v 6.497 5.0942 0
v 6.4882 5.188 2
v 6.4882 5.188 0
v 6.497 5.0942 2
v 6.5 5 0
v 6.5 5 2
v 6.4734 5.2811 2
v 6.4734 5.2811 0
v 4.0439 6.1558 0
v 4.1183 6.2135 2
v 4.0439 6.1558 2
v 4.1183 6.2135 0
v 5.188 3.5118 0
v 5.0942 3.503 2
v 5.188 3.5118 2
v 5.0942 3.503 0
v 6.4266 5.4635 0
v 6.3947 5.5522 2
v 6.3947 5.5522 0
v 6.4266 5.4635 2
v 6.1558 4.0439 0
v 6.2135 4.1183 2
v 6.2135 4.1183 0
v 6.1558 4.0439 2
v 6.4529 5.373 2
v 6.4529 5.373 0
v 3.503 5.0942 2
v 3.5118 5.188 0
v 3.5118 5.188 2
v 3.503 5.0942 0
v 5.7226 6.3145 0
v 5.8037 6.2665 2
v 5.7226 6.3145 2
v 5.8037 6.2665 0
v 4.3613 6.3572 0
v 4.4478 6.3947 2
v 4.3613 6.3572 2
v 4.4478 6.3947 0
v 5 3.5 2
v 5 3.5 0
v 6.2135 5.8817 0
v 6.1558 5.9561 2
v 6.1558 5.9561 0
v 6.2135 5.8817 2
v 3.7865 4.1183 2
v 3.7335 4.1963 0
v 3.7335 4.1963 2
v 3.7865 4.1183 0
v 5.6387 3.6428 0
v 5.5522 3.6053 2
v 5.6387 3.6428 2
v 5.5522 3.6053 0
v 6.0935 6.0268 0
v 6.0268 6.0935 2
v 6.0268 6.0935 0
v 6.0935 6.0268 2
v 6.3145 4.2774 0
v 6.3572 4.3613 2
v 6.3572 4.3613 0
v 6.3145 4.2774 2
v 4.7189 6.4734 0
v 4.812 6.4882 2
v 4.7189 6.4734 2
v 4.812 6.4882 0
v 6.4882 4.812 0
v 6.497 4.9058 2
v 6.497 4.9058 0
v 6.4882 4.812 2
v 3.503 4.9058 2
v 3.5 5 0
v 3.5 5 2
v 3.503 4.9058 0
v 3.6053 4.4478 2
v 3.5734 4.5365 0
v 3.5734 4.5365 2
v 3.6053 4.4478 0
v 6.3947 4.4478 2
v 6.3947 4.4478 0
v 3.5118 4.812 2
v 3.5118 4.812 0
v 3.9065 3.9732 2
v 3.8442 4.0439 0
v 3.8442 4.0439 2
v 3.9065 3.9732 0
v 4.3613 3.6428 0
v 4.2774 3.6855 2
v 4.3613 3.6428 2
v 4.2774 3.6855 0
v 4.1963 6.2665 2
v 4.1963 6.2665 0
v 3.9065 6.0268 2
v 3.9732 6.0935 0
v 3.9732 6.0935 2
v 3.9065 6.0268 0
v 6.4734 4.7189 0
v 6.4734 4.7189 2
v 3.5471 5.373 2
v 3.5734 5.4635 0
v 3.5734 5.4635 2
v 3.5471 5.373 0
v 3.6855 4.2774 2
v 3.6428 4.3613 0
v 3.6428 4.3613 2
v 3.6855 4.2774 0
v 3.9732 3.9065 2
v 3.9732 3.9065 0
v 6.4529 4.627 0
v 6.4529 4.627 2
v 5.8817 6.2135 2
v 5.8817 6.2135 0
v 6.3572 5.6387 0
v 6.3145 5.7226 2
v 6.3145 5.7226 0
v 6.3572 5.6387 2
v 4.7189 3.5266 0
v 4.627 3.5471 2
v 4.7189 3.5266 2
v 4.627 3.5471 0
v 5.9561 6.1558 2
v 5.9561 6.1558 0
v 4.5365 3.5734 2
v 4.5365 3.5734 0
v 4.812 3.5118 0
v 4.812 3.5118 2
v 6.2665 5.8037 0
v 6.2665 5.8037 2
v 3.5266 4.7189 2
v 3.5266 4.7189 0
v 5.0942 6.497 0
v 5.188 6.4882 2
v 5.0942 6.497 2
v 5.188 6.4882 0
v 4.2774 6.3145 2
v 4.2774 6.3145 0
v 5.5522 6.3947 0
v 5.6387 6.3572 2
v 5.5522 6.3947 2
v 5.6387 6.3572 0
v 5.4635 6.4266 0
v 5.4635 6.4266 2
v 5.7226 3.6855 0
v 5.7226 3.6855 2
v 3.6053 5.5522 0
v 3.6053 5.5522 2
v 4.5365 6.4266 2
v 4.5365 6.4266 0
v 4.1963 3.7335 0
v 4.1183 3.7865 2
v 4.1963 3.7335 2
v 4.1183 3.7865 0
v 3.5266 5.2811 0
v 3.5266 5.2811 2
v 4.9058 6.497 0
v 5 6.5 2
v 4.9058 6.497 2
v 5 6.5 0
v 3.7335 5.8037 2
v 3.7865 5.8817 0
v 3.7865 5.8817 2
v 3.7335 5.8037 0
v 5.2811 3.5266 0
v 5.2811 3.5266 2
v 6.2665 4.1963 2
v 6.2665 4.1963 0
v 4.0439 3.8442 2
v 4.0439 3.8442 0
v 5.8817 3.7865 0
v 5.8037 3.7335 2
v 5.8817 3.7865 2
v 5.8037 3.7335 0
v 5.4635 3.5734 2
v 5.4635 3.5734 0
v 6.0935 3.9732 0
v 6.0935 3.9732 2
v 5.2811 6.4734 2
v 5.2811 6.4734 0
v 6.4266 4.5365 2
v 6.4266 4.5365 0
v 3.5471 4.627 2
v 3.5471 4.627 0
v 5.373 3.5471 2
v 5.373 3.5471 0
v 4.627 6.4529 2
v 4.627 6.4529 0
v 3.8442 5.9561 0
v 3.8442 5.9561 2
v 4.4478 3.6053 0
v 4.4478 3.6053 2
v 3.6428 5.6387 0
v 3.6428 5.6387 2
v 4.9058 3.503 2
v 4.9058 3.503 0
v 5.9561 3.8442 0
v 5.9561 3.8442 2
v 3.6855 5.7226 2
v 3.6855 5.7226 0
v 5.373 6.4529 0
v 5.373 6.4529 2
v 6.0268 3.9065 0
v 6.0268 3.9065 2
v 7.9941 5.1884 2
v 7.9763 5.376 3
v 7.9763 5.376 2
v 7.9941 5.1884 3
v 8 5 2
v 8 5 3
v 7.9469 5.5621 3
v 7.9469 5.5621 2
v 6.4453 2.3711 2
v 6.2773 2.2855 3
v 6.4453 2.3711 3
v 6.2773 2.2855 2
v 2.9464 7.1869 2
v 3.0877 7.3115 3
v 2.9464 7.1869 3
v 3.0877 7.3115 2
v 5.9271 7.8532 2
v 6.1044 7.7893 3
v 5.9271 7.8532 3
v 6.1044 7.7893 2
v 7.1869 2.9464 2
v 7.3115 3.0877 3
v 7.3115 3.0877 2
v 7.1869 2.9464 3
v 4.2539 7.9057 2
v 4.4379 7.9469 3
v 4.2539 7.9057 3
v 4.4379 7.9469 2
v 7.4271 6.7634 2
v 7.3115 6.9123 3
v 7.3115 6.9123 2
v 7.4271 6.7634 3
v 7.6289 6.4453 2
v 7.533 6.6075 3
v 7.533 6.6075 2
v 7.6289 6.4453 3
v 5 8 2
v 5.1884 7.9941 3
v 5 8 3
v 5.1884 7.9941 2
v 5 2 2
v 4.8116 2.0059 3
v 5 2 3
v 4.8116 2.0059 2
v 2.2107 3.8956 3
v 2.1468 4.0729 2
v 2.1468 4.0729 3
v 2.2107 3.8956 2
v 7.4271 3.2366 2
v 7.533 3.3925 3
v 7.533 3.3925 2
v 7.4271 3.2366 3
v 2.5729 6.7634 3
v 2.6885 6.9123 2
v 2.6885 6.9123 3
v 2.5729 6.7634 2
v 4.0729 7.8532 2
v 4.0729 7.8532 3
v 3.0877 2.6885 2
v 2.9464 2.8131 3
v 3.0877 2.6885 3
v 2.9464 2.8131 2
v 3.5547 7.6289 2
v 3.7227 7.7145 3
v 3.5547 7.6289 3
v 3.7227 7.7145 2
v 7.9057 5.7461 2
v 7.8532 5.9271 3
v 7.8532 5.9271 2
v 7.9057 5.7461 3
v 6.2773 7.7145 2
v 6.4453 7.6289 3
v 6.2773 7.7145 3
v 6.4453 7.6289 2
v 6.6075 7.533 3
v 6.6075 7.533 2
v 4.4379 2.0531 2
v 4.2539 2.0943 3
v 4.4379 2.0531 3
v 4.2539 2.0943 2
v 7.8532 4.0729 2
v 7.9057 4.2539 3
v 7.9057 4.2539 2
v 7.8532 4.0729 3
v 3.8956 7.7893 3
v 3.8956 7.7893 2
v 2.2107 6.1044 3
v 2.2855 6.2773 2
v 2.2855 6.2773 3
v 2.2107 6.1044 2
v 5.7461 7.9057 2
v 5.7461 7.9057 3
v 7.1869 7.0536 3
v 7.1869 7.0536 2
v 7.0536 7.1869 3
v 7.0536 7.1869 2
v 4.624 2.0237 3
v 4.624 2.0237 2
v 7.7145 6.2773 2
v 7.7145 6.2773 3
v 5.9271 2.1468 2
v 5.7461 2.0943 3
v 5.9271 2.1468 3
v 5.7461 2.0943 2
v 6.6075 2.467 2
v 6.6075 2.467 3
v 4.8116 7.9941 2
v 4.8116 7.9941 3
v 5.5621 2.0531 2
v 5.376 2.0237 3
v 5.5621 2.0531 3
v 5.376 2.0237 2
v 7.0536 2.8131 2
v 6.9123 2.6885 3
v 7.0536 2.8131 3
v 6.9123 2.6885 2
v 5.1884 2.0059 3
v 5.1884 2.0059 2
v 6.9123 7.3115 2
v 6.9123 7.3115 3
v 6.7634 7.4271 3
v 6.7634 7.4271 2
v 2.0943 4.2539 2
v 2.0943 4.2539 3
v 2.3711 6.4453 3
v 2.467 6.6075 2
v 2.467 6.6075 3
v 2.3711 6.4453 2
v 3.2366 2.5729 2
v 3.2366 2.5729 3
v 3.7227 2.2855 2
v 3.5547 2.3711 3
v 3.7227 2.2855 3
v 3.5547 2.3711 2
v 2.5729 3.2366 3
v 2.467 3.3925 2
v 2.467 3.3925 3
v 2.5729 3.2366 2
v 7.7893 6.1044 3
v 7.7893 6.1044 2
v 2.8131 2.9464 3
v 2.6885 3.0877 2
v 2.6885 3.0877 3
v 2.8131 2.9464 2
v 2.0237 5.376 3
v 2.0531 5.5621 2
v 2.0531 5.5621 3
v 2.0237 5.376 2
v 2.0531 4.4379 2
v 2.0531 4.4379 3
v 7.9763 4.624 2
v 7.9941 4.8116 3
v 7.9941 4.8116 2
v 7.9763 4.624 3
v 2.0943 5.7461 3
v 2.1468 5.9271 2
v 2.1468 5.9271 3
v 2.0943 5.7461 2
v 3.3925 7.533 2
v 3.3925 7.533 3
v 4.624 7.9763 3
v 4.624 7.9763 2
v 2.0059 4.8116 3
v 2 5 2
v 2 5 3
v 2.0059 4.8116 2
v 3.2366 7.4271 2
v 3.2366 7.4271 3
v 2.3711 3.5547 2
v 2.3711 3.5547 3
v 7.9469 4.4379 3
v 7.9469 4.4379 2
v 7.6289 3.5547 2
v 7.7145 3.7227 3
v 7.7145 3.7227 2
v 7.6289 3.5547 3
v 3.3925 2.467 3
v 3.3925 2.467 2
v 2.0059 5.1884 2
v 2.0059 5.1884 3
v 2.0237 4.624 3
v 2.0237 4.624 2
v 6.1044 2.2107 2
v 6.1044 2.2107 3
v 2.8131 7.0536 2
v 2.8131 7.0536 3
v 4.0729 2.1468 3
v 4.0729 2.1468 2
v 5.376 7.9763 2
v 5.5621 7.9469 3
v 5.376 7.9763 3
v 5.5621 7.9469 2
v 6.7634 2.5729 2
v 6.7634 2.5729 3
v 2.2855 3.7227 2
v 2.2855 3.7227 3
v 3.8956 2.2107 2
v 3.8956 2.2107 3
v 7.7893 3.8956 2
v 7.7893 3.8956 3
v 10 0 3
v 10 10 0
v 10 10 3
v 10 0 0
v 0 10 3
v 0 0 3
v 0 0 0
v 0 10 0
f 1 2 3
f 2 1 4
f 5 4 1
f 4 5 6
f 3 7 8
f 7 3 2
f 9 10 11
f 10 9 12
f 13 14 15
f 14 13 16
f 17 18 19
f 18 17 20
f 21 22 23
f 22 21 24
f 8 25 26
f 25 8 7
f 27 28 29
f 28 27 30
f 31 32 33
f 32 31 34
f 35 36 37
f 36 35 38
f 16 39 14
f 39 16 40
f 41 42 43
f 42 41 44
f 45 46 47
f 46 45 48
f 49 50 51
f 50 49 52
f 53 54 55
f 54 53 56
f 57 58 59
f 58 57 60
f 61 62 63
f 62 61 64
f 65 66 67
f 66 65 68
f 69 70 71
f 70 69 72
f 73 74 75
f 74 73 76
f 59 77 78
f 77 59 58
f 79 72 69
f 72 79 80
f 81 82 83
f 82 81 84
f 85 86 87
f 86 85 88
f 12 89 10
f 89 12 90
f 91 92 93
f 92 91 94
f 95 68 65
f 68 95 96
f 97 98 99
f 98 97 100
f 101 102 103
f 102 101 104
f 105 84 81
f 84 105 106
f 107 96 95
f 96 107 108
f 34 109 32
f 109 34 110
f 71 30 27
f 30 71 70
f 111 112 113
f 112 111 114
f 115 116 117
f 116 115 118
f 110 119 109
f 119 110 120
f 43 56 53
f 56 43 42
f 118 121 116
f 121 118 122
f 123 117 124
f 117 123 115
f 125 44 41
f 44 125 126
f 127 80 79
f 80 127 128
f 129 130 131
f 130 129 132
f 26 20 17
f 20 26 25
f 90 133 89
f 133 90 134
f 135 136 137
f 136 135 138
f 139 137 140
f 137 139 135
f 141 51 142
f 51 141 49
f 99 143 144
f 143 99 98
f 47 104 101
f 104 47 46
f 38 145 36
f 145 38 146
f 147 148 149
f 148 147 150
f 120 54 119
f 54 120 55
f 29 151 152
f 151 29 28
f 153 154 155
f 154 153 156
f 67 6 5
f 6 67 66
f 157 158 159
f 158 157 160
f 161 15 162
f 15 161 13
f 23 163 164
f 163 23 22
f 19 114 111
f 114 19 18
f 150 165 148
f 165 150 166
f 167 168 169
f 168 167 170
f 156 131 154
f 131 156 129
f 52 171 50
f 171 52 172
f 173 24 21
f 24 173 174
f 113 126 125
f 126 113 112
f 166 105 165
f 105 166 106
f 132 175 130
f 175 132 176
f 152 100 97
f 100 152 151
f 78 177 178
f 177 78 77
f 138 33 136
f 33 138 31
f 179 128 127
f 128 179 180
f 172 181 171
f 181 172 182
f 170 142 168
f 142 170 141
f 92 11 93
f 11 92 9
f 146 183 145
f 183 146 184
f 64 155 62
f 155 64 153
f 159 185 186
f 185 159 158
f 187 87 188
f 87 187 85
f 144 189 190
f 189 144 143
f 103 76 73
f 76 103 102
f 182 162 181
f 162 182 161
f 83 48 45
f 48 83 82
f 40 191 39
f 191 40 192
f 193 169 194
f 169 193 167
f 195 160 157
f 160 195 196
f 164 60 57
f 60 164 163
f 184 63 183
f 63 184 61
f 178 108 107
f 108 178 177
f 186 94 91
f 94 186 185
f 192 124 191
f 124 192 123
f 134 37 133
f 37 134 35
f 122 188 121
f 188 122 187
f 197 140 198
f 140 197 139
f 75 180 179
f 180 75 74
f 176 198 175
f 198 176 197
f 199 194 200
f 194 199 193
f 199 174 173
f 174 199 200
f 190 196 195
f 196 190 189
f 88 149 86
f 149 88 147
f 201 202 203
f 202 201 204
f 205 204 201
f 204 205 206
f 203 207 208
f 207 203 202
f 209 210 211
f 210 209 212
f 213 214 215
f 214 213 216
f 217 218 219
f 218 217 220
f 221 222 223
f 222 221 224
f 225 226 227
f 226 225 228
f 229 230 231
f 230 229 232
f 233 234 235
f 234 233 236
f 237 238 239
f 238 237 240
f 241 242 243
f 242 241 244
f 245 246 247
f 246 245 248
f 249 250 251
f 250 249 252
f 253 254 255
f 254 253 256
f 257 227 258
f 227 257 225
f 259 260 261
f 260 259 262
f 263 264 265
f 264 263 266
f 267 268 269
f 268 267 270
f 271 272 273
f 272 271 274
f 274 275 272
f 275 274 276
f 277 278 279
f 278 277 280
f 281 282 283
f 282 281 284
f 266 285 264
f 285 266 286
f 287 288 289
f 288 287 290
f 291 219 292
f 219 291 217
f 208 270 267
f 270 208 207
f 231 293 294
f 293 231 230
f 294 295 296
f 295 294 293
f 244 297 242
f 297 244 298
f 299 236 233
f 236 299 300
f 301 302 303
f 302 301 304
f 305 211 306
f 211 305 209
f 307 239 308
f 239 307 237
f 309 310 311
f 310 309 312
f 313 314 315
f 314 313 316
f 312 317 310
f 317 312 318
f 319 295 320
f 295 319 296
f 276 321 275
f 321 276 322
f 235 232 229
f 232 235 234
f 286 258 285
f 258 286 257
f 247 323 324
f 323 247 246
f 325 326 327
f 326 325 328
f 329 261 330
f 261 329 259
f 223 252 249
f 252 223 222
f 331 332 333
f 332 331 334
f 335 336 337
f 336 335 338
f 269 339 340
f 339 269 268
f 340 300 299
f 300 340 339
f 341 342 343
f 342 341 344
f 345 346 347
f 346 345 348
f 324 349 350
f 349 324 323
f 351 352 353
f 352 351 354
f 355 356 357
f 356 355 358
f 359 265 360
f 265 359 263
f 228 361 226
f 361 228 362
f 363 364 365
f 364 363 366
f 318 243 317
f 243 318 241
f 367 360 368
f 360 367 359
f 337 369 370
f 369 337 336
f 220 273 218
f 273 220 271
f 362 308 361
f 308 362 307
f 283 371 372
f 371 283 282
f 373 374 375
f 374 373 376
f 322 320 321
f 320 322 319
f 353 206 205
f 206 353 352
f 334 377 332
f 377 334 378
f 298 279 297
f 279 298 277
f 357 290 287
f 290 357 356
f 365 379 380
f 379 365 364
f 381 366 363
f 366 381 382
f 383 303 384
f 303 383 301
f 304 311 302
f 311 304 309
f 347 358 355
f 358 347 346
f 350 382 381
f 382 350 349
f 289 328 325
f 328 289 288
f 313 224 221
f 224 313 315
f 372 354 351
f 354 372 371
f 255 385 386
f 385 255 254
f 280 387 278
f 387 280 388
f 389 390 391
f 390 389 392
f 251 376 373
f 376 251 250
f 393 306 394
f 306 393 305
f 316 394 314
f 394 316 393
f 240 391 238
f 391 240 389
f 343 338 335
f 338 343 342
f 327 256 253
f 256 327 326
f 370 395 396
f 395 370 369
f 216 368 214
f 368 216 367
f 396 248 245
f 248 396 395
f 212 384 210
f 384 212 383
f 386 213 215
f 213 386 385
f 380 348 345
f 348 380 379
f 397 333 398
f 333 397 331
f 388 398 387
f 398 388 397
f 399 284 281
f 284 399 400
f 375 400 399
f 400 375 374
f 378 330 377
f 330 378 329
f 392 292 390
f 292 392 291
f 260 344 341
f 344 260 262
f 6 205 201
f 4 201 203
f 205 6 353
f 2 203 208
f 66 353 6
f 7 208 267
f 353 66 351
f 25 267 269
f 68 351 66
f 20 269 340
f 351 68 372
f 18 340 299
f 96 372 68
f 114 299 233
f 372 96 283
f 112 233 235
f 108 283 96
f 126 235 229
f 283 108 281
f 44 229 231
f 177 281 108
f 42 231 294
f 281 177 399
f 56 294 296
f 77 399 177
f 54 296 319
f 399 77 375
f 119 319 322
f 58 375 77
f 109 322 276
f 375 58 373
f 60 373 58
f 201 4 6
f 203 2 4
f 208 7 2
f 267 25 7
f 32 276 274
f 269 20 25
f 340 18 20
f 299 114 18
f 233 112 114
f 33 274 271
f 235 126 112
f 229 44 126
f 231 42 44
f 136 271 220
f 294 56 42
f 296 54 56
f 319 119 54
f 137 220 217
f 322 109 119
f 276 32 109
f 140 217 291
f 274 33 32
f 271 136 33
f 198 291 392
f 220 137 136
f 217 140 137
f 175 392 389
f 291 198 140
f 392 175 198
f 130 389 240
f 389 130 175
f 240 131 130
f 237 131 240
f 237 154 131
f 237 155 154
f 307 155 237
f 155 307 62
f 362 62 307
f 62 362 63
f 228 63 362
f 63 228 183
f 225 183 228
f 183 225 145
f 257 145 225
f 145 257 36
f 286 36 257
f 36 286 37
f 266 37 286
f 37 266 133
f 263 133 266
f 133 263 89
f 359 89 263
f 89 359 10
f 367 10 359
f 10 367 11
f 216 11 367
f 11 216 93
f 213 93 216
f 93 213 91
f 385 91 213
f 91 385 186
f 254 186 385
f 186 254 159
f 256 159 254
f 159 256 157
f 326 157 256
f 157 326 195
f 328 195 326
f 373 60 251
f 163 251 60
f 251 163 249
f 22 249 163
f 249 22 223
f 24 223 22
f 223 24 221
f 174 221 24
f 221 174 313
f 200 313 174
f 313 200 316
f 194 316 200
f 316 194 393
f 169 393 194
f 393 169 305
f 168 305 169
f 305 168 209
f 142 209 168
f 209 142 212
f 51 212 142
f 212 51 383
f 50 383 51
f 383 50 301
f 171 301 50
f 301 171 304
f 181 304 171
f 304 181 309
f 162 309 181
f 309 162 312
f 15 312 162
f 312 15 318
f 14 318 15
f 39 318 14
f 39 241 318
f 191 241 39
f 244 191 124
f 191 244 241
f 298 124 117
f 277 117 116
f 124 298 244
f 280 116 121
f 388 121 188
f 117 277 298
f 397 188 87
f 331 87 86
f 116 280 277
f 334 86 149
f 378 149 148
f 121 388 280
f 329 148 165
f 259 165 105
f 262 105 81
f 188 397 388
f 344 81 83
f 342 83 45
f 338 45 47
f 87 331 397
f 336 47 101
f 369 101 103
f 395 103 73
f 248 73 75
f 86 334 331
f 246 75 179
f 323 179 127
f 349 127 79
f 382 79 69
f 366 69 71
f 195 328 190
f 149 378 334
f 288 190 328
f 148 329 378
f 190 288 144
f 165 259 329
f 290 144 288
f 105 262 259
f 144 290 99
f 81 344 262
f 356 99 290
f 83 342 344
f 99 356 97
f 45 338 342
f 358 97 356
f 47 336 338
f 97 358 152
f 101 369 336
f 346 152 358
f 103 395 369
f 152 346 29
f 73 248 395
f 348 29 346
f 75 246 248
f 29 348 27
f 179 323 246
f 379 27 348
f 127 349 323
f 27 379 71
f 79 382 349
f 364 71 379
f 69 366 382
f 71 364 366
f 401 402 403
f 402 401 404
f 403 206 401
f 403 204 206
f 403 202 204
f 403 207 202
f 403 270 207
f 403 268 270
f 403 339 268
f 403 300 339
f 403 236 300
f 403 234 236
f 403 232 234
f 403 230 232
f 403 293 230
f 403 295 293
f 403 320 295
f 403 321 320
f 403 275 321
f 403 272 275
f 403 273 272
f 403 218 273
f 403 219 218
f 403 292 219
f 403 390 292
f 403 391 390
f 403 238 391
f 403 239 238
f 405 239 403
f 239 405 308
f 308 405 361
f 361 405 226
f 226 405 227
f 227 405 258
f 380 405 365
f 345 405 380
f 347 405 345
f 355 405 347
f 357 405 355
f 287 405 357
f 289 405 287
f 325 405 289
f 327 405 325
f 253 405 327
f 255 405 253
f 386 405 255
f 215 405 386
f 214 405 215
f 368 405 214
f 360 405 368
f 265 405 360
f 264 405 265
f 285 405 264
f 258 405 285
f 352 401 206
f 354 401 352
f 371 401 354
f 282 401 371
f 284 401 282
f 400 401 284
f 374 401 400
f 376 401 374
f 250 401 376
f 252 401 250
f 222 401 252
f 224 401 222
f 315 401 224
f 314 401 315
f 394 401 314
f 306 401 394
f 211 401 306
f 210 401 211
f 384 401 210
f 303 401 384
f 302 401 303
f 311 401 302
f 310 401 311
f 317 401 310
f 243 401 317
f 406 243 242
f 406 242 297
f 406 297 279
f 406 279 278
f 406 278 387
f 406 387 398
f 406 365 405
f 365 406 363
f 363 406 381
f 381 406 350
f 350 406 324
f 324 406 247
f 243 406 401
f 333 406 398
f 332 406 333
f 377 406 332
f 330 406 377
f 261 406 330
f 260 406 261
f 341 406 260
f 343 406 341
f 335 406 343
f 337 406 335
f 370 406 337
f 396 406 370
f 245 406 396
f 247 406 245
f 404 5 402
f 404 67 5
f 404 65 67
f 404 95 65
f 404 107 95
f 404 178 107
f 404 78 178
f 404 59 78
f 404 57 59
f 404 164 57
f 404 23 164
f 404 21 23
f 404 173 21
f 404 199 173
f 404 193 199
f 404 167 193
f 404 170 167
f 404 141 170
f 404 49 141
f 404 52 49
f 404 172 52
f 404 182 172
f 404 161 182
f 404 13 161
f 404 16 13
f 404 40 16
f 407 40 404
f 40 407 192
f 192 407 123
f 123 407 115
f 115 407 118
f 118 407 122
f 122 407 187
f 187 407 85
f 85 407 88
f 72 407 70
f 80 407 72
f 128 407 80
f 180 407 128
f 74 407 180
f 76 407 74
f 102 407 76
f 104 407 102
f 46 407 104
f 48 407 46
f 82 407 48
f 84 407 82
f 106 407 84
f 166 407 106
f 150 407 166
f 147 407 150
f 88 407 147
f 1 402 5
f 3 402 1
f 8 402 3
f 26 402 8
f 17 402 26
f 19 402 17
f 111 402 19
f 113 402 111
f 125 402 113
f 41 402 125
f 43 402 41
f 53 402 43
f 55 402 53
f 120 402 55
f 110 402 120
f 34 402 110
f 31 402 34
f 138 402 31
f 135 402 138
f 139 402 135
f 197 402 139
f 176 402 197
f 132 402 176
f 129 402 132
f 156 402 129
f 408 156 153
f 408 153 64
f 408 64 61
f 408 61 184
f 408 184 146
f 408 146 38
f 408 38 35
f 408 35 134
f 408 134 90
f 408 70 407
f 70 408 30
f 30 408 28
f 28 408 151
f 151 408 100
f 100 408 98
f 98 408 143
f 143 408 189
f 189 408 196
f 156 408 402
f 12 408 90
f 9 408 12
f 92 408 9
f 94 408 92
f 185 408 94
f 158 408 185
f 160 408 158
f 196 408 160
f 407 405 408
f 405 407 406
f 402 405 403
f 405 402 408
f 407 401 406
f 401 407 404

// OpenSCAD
// This work is licensed under a Creative Commons Attribution-ShareAlike 4.0 International License (http://creativecommons.org/licenses/by-sa/4.0/)

module xmove(dist) { translate([dist, 0, 0]) children(); }
module ymove(dist) { translate([0, dist, 0]) children(); }
module zmove(dist) { translate([0, 0, dist]) children(); }
module xrot(angle) { rotate([angle, 0, 0]) children(); }
module yrot(angle) { rotate([0, angle, 0]) children(); }
module zrot(angle) { rotate([0, 0, angle]) children(); }
module center(dims) { translate([-dims[0]/2, -dims[1]/2, -dims[2]/2]) children(); }

module _center_by_flag(dimensions, center) {
    if (center) {
        center(dimensions) children();
    } else {
        children();
    }
}

module round_cube(dimensions, radius, center=false) {
    width = dimensions[0];
    depth = dimensions[1];
    height = dimensions[2];
    assert(radius < width/2, "radius should be less than half of x size");
    assert(radius < depth/2, "radius should be less than half of y size")
    _center_by_flag(dimensions, center)
        translate([radius, radius, 0]) 
            linear_extrude(height=height) 
                minkowski() {
                    square([width - radius*2, depth - radius*2]);
                    circle(r=radius);
                }
}

module hollow_cylinder(height, externalDiameter, internalDiameter, thickness, center=false) {
    assert(internalDiameter != undef || thickness != undef, "either internalDiameter or thickness should be passed");
    internalDiameter = internalDiameter == undef ? externalDiameter - 2*thickness : internalDiameter;
    _center_by_flag([0, 0, height], center)
        difference() {
            cylinder(height, d=externalDiameter);
            translate([0, 0, -1]) cylinder(height + 2, d=internalDiameter);
        }
}

module screw_hole(screwDiameter, headDiameter, fullHeight, headHeight) {    
    eps = 1e-4;
    headZ = fullHeight - headHeight;
    union() {
        zmove(-eps) cylinder(h=fullHeight + 2*eps, d=screwDiameter);
        zmove(headZ) cylinder(h=headHeight + eps, d=headDiameter);
    }
}

module cylinder_sector(radius, height, startAngle, endAngle) {
    assert(startAngle >= 0 && startAngle <= 360, "startAngle should be between 0 and 360");
    assert(endAngle >= 0 && endAngle <= 360, "endAngle should be between 0 and 360");
    a = endAngle - startAngle;
    angle = a < 0 ? 360 + a : a;
    echo ("angle = ", angle);
    rotate([0, 0, startAngle]) rotate_extrude(angle=angle) square([radius, height]);
}


$fn=100;

//round_cube(dimensions=[10,10,3], radius=3);
//round_cube(dimensions=[10,10,3], radius=3, center=true);
//hollow_cylinder(height=3, externalDiameter=10, internalDiameter=7);
//hollow_cylinder(height=3, externalDiameter=10, internalDiameter=7, center=true);
//hollow_cylinder(height=3, externalDiameter=10, thickness = 1, center=true);
difference() { cube([10, 10, 3]); translate([5, 5, 0]) screw_hole(screwDiameter=3, headDiameter=6, fullHeight=3, headHeight=1); }
//cylinder_sector(height=3, radius=5, startAngle=60, endAngle=180);
